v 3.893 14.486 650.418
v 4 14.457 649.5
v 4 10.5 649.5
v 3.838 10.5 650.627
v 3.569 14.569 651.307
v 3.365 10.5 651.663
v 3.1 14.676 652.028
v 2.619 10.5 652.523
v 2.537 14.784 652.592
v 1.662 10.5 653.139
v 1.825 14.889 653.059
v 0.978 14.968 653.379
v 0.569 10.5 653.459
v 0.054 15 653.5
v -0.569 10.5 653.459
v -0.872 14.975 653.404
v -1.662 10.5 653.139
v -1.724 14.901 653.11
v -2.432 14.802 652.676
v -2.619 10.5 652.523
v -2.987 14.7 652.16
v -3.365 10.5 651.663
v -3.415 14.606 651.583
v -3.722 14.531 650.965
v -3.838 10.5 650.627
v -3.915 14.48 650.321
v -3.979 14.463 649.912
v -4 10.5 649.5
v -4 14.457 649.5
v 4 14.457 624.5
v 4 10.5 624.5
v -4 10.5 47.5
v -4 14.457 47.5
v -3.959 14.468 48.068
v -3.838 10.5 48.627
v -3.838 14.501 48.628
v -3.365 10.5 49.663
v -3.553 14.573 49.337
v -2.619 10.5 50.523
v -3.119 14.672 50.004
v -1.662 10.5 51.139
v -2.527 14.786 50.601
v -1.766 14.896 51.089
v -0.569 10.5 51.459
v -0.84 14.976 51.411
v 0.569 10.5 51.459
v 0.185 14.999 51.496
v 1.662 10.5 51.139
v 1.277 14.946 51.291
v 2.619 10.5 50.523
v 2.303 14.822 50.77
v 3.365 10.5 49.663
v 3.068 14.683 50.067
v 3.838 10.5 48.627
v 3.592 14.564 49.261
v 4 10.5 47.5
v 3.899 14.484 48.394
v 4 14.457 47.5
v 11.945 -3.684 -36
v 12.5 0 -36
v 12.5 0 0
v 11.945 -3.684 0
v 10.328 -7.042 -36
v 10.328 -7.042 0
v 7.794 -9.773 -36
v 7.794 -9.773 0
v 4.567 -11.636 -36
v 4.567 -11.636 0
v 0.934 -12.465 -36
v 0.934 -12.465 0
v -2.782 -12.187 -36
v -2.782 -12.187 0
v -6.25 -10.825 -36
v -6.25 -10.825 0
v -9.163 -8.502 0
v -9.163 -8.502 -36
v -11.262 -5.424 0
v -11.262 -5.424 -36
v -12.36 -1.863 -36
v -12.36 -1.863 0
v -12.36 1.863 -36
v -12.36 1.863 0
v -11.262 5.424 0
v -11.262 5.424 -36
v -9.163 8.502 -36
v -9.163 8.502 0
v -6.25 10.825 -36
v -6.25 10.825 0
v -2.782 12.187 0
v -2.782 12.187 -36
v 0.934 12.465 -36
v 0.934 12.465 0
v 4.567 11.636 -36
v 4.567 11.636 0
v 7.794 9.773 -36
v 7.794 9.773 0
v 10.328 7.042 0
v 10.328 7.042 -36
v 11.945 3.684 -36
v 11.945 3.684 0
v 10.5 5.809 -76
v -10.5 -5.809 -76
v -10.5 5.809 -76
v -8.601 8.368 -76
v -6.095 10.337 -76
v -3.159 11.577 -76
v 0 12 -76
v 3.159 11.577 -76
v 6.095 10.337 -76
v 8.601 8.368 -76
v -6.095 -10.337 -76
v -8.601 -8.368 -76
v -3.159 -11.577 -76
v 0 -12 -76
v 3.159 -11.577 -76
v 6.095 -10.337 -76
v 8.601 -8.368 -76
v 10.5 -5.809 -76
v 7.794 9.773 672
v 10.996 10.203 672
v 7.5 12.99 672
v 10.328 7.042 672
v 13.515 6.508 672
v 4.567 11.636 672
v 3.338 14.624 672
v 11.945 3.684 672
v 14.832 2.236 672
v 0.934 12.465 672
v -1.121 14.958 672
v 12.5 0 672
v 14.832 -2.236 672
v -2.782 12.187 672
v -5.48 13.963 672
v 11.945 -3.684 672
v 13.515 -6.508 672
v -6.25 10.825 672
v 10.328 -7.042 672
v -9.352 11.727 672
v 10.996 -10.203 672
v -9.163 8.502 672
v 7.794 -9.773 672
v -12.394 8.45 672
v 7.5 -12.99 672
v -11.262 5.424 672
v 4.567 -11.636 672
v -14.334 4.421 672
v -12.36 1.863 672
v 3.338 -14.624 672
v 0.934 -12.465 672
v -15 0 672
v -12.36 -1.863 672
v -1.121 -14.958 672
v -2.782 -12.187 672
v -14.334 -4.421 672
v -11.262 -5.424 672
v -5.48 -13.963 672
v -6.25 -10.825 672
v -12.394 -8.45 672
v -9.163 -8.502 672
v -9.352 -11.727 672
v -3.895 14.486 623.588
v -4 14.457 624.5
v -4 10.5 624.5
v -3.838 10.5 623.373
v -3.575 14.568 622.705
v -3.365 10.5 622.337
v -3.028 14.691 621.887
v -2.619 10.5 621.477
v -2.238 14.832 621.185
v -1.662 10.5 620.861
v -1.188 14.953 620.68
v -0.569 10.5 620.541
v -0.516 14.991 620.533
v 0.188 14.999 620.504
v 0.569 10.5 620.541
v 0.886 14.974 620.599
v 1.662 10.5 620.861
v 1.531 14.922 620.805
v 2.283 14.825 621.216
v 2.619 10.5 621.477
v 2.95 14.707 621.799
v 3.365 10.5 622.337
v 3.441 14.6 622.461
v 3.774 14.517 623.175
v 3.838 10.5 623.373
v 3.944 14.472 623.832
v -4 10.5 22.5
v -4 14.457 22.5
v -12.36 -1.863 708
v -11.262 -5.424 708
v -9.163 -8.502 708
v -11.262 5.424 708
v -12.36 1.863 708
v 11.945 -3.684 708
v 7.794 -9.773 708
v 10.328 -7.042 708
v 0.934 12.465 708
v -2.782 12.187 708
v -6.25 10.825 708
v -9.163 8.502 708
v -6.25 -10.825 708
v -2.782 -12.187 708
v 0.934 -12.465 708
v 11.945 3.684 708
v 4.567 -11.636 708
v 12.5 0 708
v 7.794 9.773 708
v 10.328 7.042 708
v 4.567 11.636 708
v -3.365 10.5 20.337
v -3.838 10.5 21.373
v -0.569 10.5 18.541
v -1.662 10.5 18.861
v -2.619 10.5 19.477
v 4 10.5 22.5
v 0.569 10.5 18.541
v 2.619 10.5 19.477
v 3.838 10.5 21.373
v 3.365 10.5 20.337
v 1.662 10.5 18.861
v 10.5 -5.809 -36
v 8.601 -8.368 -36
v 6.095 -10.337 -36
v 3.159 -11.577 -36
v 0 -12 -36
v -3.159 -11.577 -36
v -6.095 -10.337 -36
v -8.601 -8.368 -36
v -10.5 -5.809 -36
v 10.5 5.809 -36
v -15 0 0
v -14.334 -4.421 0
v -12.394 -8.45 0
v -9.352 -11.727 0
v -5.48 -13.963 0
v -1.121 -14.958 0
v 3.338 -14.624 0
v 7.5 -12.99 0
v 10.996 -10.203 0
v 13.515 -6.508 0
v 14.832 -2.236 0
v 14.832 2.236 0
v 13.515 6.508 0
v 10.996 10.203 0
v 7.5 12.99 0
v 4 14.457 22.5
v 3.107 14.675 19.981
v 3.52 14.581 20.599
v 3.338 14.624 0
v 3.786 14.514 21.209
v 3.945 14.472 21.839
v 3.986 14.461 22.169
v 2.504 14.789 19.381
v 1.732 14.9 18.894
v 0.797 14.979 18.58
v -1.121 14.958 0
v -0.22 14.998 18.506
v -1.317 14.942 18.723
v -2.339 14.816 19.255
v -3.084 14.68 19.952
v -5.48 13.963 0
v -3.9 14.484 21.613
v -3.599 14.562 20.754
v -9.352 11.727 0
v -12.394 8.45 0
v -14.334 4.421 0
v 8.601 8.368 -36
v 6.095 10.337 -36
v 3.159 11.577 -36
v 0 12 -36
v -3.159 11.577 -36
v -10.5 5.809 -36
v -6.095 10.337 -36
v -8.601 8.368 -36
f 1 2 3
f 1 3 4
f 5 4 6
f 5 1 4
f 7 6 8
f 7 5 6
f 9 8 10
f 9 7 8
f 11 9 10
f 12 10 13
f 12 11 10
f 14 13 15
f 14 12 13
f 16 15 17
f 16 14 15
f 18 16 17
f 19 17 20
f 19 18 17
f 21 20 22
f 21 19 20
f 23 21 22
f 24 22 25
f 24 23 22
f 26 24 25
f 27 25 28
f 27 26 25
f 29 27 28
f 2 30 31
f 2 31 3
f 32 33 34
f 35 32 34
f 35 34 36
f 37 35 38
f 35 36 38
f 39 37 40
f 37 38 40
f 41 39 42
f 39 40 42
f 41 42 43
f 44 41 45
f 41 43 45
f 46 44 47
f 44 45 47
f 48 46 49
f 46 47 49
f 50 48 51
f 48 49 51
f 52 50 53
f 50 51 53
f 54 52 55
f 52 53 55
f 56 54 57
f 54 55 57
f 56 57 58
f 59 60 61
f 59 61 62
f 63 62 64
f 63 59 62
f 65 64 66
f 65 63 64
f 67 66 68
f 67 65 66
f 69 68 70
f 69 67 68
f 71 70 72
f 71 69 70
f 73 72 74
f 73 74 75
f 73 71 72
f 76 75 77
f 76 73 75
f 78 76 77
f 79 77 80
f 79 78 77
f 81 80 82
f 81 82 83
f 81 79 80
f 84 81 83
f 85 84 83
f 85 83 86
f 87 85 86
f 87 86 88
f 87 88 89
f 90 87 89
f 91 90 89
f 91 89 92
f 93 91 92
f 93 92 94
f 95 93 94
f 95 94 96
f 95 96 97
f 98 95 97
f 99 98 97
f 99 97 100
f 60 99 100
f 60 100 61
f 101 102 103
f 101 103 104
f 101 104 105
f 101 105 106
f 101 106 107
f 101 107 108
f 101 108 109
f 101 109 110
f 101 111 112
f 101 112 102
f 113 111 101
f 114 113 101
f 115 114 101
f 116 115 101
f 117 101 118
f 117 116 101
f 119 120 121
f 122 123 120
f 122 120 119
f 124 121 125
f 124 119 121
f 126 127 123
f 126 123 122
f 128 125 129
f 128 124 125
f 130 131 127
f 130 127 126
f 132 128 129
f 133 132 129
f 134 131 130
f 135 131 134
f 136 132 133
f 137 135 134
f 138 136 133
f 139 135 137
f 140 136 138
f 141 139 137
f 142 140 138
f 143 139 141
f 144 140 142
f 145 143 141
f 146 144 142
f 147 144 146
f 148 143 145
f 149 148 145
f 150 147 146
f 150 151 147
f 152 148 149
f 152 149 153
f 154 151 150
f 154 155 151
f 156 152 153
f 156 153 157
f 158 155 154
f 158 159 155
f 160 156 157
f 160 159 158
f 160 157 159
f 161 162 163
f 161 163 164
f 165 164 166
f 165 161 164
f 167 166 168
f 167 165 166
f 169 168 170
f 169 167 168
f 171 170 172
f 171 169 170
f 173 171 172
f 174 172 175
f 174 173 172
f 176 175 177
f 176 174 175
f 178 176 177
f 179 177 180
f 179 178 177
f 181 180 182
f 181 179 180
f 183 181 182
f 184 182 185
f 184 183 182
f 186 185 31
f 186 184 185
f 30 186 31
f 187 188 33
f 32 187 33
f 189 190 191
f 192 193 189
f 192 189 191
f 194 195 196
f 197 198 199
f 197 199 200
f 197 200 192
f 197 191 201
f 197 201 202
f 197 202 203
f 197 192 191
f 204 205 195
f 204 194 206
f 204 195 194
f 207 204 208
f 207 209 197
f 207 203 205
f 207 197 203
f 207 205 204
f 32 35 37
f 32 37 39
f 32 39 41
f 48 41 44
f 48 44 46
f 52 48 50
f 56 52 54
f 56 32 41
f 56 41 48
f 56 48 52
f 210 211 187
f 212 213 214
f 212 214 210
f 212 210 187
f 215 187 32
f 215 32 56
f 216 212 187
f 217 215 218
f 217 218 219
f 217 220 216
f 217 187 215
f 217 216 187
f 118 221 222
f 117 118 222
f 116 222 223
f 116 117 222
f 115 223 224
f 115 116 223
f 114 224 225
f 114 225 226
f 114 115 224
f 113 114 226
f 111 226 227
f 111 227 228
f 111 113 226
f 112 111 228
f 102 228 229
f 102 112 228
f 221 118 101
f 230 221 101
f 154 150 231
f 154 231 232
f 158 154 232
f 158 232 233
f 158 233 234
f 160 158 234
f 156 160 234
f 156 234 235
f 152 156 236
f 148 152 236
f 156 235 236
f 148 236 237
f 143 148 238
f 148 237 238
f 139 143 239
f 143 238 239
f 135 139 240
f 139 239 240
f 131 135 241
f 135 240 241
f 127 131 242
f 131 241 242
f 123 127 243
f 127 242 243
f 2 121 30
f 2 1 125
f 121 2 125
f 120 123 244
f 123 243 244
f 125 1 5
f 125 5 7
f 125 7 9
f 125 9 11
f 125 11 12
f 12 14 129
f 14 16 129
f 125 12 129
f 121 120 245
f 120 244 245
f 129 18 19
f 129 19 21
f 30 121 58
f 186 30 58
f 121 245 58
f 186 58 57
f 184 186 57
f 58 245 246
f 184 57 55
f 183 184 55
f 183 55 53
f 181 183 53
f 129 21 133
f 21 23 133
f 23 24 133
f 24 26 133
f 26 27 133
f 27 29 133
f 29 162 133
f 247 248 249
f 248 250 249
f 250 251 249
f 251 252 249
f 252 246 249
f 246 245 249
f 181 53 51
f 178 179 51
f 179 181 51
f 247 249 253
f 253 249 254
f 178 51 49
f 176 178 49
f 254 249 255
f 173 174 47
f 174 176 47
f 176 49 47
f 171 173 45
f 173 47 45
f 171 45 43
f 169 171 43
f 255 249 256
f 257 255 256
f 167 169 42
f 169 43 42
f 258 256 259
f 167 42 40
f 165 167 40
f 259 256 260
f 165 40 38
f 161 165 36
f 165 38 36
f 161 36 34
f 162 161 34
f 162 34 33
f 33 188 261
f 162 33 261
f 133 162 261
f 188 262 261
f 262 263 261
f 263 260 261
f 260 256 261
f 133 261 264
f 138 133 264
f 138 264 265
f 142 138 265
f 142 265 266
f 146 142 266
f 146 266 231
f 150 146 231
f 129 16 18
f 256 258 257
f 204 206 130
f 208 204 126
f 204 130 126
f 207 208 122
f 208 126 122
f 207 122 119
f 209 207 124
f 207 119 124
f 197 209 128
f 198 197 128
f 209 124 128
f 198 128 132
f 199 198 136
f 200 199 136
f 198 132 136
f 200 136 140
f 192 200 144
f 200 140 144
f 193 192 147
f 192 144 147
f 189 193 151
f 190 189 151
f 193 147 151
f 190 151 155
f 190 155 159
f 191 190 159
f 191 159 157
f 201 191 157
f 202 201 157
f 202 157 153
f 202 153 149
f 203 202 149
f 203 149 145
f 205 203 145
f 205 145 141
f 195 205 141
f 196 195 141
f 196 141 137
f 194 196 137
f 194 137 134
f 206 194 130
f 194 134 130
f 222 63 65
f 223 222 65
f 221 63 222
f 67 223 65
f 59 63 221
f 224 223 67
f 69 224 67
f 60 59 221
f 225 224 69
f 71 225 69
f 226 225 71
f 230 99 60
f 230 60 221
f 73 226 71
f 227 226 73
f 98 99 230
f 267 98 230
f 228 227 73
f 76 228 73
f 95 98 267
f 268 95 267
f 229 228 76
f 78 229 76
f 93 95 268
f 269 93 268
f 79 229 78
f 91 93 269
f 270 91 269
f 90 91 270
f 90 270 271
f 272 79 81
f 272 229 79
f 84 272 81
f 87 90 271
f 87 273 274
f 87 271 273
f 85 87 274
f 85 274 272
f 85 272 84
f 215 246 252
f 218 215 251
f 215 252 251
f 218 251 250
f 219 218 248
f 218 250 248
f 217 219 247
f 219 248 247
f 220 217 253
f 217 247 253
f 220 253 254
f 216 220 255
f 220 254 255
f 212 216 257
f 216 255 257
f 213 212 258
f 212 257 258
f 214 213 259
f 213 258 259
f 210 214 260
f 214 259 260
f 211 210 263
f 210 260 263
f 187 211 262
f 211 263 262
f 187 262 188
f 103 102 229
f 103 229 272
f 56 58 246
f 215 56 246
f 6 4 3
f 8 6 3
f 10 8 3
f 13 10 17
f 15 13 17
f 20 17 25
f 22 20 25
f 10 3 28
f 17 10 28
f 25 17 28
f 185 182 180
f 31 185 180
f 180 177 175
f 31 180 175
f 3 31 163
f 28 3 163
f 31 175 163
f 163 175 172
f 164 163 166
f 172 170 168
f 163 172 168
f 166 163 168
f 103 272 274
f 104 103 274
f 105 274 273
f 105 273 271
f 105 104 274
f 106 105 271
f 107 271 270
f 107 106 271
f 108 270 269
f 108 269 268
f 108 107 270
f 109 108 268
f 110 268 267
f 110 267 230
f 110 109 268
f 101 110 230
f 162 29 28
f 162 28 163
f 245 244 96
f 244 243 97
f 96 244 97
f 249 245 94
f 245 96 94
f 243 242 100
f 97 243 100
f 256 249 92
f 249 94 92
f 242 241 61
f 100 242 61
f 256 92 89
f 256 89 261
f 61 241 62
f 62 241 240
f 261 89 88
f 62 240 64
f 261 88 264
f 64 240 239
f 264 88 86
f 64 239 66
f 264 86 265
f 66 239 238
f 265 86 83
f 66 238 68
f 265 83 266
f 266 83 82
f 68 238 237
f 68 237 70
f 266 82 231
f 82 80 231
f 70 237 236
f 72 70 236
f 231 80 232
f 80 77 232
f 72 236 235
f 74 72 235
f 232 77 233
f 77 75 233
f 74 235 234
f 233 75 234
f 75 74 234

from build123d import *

# Parameters (mm, degrees)
SKETCH1_R           = 15
BOSS_EXTRUDE1_DEPTH = 672
SKETCH2_R           = 12.5
BOSS_EXTRUDE3_DEPTH = 36
BOSS_EXTRUDE4_START = 90
SKETCH3_R           = 12.5
BOSS_EXTRUDE4_DEPTH = 90
SKETCH6_R           = 13.02430926
SKETCH6_R_2         = 12
CUT_EXTRUDE3_DEPTH  = 54
CUT_EXTRUDE2_DEPTH  = 4.5
MOVE_FACE1_BY       = 14
SKETCH7_W           = 4
SKETCH7_H           = 18
CUT_EXTRUDE4_DEPTH  = 40


with BuildPart() as part:
    # Sketch1 → Boss-Extrude1 (new body)
    with BuildSketch(Plane.XY):
        with Locations(Location((0, 0, 0), (0, 0, 180))):
            Circle(SKETCH1_R)
    extrude(amount=BOSS_EXTRUDE1_DEPTH)

    # Sketch2 → Boss-Extrude3 (add)
    with BuildSketch(Plane.XY.offset(672)):
        Circle(SKETCH2_R)
    extrude(amount=BOSS_EXTRUDE3_DEPTH)

    # Sketch3 → Boss-Extrude4 (add)
    with BuildSketch(Plane(origin=(0, 0, 0), x_dir=(-1, 0, 0), z_dir=(0, 0, -1)).offset(BOSS_EXTRUDE4_START)):
        with Locations(Location((0, 0, 0), (0, 0, 180))):
            Circle(SKETCH3_R)
    extrude(amount=-BOSS_EXTRUDE4_DEPTH)

    # Sketch6 → Cut-Extrude3 (cut)
    with BuildSketch(Plane(origin=(0, 0, -90), x_dir=(-1, 0, 0), z_dir=(0, 0, -1))):
        Circle(SKETCH6_R)
        Circle(SKETCH6_R_2, mode=Mode.SUBTRACT)
    extrude(amount=-CUT_EXTRUDE3_DEPTH, mode=Mode.SUBTRACT)

    # Sketch5 → Cut-Extrude2 (cut)
    with BuildSketch(Plane(origin=(0, 15, 0), x_dir=(1, 0, 0), z_dir=(0, 1, 0))):
        with BuildLine():
            Line((4, -624.5), (4, -649.5))
            ThreePointArc((4, -649.5), (0, -653.5), (-4, -649.5))
            Line((-4, -649.5), (-4, -624.5))
            ThreePointArc((-4, -624.5), (0, -620.5), (4, -624.5))
        make_face()
        with BuildLine():
            Line((4, -47.5), (4, -22.5))
            ThreePointArc((4, -22.5), (0, -18.5), (-4, -22.5))
            Line((-4, -22.5), (-4, -47.5))
            ThreePointArc((-4, -47.5), (0, -51.5), (4, -47.5))
        make_face()
    extrude(amount=-CUT_EXTRUDE2_DEPTH, mode=Mode.SUBTRACT)

    # Move Face1: a face moved inward by 14.0
    extrude(part.faces().sort_by_distance((0, 0, -90))[0], amount=MOVE_FACE1_BY, dir=(0, 0, 1), mode=Mode.SUBTRACT)

    # Sketch7 → Cut-Extrude4 (cut)
    with BuildSketch(Plane(origin=(0, 0, -76), x_dir=(-1, 0, 0), z_dir=(0, 0, -1))):
        with Locations((12.5, 0)):
            Rectangle(SKETCH7_W, SKETCH7_H)
        with Locations((-12.5, 0)):
            Rectangle(SKETCH7_W, SKETCH7_H)
    extrude(amount=-CUT_EXTRUDE4_DEPTH, mode=Mode.SUBTRACT)


solid = part.part
